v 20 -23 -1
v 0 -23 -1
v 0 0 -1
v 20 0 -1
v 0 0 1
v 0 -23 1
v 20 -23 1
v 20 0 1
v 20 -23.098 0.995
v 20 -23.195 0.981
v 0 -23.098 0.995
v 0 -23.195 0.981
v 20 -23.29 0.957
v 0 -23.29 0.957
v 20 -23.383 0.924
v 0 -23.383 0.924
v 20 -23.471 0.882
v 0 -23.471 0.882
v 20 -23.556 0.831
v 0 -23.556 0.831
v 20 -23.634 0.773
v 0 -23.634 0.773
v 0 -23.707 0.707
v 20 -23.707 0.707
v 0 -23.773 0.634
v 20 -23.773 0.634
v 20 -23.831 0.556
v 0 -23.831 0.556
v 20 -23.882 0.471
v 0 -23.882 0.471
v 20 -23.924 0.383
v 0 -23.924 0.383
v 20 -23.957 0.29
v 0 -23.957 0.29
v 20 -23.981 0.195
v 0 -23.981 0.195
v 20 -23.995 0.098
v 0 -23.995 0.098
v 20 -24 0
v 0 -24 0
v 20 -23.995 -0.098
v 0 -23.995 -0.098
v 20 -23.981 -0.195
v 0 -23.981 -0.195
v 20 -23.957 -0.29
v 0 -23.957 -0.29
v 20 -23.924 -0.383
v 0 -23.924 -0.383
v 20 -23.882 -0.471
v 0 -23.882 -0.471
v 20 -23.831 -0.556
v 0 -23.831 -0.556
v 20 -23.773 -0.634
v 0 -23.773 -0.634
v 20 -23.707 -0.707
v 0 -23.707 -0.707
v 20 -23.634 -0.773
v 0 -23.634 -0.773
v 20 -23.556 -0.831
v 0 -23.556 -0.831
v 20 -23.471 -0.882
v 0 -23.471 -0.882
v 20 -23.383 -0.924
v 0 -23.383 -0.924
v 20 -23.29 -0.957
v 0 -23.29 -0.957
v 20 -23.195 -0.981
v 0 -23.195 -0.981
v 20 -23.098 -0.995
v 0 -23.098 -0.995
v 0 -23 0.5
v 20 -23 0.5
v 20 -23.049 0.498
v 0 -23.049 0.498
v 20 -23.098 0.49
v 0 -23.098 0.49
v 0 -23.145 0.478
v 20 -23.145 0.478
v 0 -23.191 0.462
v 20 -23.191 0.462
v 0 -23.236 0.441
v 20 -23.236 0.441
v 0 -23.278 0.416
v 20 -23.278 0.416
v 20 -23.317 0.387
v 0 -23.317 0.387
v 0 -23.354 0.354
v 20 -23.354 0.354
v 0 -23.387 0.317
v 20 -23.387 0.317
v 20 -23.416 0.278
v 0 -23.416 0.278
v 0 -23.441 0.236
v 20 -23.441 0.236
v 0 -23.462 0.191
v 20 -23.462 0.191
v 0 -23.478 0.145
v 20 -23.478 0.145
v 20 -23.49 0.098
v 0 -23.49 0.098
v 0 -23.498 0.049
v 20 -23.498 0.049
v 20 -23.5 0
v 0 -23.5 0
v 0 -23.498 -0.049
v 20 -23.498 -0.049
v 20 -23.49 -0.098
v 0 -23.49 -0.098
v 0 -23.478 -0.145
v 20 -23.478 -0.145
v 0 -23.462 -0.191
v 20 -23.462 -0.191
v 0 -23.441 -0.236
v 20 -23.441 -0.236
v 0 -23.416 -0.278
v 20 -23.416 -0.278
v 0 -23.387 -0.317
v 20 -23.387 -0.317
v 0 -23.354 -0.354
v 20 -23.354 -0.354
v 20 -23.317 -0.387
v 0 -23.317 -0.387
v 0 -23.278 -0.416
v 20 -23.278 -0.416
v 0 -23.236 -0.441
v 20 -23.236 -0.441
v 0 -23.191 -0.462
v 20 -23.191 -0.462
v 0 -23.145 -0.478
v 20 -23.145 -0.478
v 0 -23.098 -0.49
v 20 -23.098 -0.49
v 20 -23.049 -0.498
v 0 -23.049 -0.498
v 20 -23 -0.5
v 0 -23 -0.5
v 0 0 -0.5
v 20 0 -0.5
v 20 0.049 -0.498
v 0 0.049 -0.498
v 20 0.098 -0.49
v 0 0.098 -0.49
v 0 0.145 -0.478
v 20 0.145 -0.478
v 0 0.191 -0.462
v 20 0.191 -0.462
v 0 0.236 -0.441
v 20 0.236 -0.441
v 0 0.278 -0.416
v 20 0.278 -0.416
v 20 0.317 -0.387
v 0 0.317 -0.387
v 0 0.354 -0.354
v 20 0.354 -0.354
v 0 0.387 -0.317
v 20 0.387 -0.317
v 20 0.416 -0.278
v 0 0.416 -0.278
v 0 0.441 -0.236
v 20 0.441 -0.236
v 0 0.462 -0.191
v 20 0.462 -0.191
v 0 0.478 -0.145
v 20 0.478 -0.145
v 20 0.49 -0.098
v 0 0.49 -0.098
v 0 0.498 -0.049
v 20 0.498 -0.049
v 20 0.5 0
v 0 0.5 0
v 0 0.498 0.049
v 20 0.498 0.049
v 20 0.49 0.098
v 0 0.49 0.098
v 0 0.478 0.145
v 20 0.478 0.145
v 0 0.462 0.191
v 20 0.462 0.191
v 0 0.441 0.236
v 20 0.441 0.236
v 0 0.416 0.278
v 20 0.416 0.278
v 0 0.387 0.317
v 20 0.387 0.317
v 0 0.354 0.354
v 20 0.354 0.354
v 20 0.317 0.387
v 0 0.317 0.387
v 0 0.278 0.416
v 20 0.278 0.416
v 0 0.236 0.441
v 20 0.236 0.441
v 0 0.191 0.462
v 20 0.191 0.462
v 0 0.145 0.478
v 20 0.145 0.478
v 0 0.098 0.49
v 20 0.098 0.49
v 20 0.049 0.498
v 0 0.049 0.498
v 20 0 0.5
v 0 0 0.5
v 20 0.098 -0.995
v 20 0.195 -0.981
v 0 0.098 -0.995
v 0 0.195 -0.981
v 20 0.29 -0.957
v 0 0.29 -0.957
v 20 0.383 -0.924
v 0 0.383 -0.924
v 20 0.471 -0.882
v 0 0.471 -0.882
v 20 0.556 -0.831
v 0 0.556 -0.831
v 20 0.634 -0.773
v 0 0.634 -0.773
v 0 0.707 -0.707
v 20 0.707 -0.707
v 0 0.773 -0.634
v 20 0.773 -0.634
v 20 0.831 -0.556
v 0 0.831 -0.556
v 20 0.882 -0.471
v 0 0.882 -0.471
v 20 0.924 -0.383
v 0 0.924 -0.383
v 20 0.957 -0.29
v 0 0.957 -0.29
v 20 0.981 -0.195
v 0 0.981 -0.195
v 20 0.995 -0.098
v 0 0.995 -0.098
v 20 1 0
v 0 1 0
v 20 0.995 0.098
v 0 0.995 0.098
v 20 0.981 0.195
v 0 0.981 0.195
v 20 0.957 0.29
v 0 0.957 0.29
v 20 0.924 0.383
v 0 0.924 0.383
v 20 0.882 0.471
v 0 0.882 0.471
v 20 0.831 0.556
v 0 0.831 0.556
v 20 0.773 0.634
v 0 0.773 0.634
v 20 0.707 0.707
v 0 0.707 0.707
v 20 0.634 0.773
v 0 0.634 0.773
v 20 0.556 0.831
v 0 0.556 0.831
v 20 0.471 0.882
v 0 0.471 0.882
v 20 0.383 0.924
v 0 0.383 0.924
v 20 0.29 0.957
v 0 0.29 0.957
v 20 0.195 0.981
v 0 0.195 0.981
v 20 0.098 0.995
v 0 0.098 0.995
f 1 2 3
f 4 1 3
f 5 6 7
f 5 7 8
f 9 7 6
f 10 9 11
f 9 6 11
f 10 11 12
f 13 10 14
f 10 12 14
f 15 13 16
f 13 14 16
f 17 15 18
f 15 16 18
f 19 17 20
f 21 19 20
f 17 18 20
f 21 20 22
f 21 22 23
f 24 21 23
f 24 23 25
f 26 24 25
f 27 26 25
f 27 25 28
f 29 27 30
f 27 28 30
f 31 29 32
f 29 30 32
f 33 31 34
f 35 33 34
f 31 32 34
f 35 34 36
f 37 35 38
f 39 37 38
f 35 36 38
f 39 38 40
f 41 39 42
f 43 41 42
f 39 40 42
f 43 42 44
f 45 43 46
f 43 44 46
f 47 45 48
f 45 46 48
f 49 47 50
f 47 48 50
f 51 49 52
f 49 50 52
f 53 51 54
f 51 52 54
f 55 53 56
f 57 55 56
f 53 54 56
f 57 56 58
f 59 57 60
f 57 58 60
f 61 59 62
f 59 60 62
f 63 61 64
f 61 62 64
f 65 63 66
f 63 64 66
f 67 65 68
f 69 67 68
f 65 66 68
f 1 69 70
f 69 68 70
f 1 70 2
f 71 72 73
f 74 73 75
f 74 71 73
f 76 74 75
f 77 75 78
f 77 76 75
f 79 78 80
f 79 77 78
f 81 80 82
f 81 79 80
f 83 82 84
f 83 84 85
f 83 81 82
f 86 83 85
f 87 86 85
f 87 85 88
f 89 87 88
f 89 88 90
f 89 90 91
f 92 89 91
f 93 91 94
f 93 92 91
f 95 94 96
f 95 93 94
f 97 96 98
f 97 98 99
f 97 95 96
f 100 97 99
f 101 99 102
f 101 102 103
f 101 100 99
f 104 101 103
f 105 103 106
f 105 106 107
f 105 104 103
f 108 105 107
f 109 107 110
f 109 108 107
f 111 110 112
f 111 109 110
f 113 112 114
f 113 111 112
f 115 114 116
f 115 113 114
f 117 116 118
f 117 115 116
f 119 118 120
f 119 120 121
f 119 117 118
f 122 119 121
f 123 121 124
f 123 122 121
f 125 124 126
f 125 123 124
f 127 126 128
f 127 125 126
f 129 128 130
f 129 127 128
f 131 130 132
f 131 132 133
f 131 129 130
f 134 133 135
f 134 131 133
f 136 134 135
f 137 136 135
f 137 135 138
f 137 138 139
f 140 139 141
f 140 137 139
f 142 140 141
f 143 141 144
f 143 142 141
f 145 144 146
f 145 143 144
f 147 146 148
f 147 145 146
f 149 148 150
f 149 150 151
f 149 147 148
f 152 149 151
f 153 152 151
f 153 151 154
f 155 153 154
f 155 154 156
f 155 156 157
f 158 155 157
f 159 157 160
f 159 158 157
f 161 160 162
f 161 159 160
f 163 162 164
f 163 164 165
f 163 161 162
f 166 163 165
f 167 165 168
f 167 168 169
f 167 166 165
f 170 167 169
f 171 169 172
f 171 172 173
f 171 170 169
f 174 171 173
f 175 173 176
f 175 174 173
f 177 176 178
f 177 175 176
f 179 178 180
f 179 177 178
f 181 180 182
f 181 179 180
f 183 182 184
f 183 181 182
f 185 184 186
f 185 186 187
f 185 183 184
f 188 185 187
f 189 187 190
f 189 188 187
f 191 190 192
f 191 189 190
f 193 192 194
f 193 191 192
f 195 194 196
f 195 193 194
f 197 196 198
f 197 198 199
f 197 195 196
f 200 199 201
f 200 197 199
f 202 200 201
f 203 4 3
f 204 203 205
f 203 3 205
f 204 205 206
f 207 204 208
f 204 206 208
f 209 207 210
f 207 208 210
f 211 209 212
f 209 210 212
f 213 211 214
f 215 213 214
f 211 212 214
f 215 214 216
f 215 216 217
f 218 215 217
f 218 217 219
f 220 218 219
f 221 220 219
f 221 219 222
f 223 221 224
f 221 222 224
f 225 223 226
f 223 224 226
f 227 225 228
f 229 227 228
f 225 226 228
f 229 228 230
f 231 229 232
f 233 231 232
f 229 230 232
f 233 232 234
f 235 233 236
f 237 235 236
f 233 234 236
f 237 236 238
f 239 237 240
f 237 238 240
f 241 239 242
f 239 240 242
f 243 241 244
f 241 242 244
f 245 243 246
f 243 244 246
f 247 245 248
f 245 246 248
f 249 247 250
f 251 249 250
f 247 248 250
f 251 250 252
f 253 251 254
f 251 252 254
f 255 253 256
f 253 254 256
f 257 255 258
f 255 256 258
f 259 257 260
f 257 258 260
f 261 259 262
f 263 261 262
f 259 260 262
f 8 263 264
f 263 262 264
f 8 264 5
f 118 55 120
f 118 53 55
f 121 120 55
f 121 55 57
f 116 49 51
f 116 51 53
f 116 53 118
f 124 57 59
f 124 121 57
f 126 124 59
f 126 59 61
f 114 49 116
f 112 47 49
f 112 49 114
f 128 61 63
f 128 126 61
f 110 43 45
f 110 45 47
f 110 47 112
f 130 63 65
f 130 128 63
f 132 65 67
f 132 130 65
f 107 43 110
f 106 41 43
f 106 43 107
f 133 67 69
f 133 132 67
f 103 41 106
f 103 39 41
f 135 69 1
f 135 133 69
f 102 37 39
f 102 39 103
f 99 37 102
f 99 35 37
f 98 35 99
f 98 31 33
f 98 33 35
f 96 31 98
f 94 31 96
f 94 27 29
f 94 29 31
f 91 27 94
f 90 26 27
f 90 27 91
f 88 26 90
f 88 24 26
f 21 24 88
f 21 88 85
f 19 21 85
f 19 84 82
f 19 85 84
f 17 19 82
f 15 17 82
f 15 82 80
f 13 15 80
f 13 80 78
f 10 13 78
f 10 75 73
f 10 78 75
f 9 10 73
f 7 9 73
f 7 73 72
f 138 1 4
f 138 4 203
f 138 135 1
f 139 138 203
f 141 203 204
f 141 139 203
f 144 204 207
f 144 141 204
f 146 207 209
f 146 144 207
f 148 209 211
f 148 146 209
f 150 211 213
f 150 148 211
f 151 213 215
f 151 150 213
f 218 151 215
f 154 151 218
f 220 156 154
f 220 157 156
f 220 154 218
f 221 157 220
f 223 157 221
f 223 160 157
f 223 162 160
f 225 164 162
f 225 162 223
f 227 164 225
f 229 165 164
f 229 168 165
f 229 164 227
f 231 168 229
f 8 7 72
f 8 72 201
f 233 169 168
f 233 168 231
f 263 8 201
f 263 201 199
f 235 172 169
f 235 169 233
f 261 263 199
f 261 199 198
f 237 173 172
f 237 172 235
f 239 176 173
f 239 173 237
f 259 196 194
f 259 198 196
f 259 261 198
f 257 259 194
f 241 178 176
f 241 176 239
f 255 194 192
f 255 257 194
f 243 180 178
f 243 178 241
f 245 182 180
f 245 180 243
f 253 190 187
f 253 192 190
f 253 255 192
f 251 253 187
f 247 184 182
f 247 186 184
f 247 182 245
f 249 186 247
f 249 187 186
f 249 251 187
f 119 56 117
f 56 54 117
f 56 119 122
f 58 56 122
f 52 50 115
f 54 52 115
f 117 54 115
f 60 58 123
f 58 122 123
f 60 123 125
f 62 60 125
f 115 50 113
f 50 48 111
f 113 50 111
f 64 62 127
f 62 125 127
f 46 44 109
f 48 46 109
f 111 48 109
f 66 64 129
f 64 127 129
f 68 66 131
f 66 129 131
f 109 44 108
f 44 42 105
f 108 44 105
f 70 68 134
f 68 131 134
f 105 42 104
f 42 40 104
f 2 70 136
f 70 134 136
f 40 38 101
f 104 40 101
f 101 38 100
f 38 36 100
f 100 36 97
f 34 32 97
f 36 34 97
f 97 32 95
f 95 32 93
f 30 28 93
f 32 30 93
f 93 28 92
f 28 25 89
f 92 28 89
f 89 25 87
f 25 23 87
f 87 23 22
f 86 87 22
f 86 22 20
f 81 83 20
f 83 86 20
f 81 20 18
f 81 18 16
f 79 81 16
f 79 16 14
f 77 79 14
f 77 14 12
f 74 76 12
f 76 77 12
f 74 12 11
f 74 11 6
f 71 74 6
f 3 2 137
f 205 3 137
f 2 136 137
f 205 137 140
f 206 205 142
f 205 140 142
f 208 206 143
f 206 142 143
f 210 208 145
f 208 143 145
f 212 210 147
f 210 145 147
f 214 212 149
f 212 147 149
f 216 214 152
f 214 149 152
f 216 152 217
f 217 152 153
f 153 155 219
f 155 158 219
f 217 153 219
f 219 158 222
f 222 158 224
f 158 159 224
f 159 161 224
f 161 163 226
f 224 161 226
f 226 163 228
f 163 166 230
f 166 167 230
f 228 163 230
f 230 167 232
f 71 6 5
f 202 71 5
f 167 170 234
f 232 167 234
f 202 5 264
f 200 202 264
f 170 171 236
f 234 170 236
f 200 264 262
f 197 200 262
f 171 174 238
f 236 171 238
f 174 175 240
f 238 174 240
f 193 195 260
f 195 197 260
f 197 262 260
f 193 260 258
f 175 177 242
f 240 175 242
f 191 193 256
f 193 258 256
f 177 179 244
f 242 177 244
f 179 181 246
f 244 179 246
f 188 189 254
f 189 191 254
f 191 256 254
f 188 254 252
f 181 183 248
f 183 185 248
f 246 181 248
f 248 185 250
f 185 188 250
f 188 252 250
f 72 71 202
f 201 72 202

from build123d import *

# Parameters (mm, degrees)
PAD_DEPTH = 20


with BuildPart() as part:
    # Sketch → Pad (new body)
    with BuildSketch(Plane.YZ):
        with BuildLine():
            Line((-23, -1), (0, -1))
            ThreePointArc((0, -1), (1, 0), (0, 1))
            Line((-23, 1), (0, 1))
            ThreePointArc((-23, 1), (-24, 0), (-23, -1))
        make_face()
        with BuildLine():
            Line((-23, -0.5), (0, -0.5))
            ThreePointArc((0, -0.5), (0.5, 0), (0, 0.5))
            Line((-23, 0.5), (0, 0.5))
            ThreePointArc((-23, 0.5), (-23.5, 0), (-23, -0.5))
        make_face(mode=Mode.SUBTRACT)
    extrude(amount=PAD_DEPTH)


solid = part.part
